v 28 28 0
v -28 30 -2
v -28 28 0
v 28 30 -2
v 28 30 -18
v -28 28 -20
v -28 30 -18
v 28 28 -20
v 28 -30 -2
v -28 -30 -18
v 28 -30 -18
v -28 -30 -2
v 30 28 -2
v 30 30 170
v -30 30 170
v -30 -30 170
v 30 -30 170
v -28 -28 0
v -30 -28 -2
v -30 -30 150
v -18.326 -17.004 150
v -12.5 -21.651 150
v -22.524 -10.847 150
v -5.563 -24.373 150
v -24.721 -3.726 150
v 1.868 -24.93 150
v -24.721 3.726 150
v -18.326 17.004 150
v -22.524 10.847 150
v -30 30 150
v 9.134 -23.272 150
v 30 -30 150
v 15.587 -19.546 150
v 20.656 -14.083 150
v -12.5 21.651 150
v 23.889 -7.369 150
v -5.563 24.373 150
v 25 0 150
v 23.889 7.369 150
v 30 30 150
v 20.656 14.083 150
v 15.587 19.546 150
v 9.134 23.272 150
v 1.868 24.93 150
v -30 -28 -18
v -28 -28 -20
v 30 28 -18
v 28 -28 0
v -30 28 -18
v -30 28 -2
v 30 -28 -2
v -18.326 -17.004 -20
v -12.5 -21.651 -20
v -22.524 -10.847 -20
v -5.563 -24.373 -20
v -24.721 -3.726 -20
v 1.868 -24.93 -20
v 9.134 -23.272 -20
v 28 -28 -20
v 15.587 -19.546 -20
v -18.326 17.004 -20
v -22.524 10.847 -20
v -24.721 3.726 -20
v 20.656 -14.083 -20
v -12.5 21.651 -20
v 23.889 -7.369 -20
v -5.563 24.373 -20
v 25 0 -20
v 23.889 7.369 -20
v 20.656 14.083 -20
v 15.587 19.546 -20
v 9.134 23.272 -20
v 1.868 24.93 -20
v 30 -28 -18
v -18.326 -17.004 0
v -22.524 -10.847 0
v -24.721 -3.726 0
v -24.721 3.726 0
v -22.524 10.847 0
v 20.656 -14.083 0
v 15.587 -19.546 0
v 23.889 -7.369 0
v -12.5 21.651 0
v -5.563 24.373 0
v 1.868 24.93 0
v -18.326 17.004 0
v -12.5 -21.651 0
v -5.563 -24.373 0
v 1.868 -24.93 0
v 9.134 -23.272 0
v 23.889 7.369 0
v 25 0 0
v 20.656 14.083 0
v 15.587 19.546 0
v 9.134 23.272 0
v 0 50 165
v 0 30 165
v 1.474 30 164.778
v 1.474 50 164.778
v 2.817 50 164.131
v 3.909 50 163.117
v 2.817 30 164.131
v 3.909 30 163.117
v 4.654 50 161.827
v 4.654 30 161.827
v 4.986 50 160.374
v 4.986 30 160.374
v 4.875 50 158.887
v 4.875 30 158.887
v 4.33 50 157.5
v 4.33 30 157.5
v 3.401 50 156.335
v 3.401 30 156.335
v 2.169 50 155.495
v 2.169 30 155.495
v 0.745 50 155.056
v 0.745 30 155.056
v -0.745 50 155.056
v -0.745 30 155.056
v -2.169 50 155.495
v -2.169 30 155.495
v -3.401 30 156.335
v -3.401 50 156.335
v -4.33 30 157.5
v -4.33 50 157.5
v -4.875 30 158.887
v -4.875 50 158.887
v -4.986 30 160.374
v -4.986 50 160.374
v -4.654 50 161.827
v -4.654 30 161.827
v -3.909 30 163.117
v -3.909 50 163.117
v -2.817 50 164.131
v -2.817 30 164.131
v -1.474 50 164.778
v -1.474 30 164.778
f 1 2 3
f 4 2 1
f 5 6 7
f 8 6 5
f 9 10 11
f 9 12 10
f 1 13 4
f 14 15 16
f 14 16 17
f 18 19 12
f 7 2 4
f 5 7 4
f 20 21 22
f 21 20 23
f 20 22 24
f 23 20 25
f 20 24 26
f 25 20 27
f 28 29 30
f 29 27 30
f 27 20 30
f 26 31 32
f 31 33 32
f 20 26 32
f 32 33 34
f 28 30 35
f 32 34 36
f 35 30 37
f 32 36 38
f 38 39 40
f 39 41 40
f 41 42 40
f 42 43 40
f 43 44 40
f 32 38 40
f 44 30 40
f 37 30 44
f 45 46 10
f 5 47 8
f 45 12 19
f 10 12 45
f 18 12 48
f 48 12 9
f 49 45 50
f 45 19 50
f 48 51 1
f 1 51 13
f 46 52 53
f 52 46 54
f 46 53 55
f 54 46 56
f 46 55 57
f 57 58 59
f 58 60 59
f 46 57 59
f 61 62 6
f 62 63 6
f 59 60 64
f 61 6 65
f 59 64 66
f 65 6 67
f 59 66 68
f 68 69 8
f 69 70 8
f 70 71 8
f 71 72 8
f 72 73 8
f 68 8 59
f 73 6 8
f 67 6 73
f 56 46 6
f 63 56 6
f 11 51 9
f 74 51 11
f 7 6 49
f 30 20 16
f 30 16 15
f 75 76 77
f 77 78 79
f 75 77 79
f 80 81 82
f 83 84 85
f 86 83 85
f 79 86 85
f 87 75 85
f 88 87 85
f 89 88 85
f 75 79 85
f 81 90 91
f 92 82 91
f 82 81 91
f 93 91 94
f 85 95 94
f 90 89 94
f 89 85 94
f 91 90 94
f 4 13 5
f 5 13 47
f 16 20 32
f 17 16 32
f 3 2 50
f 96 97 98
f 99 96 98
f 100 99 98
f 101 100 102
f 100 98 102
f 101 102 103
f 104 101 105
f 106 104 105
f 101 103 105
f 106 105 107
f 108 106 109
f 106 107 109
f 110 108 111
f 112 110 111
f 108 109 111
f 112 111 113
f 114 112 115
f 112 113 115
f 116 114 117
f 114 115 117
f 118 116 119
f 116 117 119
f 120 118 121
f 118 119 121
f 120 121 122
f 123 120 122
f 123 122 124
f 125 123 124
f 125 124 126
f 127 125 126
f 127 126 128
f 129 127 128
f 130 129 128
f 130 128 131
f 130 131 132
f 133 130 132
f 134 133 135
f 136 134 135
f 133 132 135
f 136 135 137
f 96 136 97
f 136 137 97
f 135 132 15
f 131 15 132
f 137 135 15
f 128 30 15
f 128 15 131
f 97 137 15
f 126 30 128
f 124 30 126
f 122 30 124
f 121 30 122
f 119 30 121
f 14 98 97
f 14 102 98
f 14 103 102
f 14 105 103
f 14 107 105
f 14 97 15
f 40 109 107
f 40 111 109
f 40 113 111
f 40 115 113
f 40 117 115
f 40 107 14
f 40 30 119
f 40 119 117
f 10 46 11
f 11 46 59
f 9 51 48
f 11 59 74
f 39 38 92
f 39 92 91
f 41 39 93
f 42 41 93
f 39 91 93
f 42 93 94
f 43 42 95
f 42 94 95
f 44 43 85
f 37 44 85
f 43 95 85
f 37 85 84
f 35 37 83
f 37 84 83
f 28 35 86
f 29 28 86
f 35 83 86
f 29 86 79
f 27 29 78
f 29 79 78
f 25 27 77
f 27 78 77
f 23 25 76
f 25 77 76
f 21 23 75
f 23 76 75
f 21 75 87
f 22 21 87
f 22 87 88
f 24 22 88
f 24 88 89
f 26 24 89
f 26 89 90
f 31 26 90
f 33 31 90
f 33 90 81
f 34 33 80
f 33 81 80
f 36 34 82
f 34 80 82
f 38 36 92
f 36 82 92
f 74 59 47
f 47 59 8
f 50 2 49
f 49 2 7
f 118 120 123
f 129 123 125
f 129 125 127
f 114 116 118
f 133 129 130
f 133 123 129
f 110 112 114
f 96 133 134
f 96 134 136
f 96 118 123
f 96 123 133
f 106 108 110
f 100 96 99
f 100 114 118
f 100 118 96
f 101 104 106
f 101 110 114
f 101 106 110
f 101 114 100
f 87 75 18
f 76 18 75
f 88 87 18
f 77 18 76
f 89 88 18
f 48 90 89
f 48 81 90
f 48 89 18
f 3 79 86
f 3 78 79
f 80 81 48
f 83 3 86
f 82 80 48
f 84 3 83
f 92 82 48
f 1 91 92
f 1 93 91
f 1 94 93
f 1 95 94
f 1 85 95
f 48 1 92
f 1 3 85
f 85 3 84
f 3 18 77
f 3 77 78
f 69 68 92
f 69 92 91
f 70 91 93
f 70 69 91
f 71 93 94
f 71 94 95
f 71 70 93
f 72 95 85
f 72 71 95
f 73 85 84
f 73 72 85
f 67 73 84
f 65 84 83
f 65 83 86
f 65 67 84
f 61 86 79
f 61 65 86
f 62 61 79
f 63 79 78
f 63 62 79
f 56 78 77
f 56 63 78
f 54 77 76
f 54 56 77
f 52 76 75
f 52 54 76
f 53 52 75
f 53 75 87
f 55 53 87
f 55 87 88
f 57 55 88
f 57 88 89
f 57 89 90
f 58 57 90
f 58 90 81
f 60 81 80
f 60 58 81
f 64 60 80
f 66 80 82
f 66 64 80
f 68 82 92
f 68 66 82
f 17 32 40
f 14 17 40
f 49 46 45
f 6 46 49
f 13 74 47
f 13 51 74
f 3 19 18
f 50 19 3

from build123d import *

# Parameters (mm, degrees)
SKETCH1_R           = 25
BOSS_EXTRUDE1_DEPTH = 150
SKETCH2_W           = 60
SKETCH2_H           = 60
BOSS_EXTRUDE2_DEPTH = 20
SKETCH3_W           = 60
SKETCH3_H           = 60
BOSS_EXTRUDE3_DEPTH = 20
SKETCH4_R           = 25
CUT_EXTRUDE1_DEPTH  = 20
SKETCH5_R           = 5
BOSS_EXTRUDE4_DEPTH = 20
CHAMFER1_SIZE       = 2


with BuildPart() as part:
    # Sketch1 → Boss-Extrude1 (new body)
    with BuildSketch(Plane.XY):
        Circle(SKETCH1_R)
    extrude(amount=BOSS_EXTRUDE1_DEPTH)

    # Sketch2 → Boss-Extrude2 (add)
    with BuildSketch(Plane.XY):
        Rectangle(SKETCH2_W, SKETCH2_H)
    extrude(amount=-BOSS_EXTRUDE2_DEPTH)

    # Sketch3 → Boss-Extrude3 (add)
    with BuildSketch(Plane.XY.offset(150)):
        Rectangle(SKETCH3_W, SKETCH3_H)
    extrude(amount=BOSS_EXTRUDE3_DEPTH)

    # Sketch4 → Cut-Extrude1 (cut)
    with BuildSketch(Plane.XY.offset(-20)):
        Circle(SKETCH4_R)
    extrude(amount=CUT_EXTRUDE1_DEPTH, mode=Mode.SUBTRACT)


with BuildPart() as cut_extrude1_piece_1:
    # of the separate pieces the step leaves, piece 1, a body of its own (cut_extrude1_pieces)
    add(part.part.solids().sort_by_distance((-30, -30, 150))[0])

    # Sketch5 → Boss-Extrude4 (add)
    with BuildSketch(Plane(origin=(0, 30, 0), x_dir=(1, 0, 0), z_dir=(0, 1, 0))):
        with Locations((0, -160)):
            Circle(SKETCH5_R)
    extrude(amount=BOSS_EXTRUDE4_DEPTH)


with BuildPart() as cut_extrude1_piece_2:
    # of the separate pieces the step leaves, piece 2, a body of its own (cut_extrude1_pieces)
    add(part.part.solids().sort_by_distance((-30, -30, 0))[0])

    # Chamfer1
    chamfer1_edges = [cut_extrude1_piece_2.edges().sort_by_distance(p)[0] for p in [
        (0, -30, -20),
        (-30, 0, -20),
        (0, 30, -20),
        (30, 0, -20),
        (0, -30, 0),
        (-30, -30, -10),
        (-30, 0, 0),
        (-30, 30, -10),
        (0, 30, 0),
        (30, -30, -10),
        (30, 0, 0),
        (30, 30, -10),
    ]]
    chamfer(chamfer1_edges, length=CHAMFER1_SIZE)


solid = Compound([cut_extrude1_piece_1.part, cut_extrude1_piece_2.part])
